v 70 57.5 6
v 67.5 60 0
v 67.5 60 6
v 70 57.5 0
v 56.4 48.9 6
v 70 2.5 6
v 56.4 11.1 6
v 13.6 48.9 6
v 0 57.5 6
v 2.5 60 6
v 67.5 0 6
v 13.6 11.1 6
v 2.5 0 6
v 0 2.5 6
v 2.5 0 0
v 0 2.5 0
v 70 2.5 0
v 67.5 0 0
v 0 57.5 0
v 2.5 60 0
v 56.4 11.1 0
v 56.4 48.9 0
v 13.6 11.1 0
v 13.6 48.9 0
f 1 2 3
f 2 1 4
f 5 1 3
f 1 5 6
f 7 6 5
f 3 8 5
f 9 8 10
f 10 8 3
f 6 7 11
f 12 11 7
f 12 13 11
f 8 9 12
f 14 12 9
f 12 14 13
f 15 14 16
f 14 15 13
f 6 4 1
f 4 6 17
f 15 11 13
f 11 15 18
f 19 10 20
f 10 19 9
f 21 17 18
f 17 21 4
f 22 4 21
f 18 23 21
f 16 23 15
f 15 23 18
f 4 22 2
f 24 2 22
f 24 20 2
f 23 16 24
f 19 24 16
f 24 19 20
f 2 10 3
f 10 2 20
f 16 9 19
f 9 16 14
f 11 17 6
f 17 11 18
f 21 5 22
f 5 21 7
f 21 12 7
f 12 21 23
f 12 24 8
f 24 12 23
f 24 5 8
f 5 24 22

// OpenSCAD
$fn = 32;

// ----------------------------------------------------------------------
// Windowed plate: 1 voids, 70 x 60 x 6 mm
// ----------------------------------------------------------------------

// --- parameters (mm) ---
plate_l = 70;             // plate length, X
plate_w = 60;             // plate width, Y
plate_t = 6;              // plate thickness, Z
edge_margin = 8;          // wall from the plate edge to any window
win1_l = 42.8;            // window length
win1_w = 37.8;            // window width
depth_1 = 6;              // depth of void 1 (full thickness = through)
corner_c = 2.5;           // corner chamfer of the plate

profile = [[2.5, 0], [67.5, 0], [70, 2.5], [70, 57.5], [67.5, 60], [2.5, 60], [0, 57.5], [0, 2.5]];  // primary outline, 8 points, counter clockwise
void_1 = [[13.6, 11.1], [56.4, 11.1], [56.4, 48.9], [13.6, 48.9]];  // large central window, 4 points

// --- the one profile operation ---
difference() {
  linear_extrude(height = plate_t) polygon(points = profile);
  translate([0, 0, -1])
    linear_extrude(height = plate_t + 2) polygon(points = void_1);
}
